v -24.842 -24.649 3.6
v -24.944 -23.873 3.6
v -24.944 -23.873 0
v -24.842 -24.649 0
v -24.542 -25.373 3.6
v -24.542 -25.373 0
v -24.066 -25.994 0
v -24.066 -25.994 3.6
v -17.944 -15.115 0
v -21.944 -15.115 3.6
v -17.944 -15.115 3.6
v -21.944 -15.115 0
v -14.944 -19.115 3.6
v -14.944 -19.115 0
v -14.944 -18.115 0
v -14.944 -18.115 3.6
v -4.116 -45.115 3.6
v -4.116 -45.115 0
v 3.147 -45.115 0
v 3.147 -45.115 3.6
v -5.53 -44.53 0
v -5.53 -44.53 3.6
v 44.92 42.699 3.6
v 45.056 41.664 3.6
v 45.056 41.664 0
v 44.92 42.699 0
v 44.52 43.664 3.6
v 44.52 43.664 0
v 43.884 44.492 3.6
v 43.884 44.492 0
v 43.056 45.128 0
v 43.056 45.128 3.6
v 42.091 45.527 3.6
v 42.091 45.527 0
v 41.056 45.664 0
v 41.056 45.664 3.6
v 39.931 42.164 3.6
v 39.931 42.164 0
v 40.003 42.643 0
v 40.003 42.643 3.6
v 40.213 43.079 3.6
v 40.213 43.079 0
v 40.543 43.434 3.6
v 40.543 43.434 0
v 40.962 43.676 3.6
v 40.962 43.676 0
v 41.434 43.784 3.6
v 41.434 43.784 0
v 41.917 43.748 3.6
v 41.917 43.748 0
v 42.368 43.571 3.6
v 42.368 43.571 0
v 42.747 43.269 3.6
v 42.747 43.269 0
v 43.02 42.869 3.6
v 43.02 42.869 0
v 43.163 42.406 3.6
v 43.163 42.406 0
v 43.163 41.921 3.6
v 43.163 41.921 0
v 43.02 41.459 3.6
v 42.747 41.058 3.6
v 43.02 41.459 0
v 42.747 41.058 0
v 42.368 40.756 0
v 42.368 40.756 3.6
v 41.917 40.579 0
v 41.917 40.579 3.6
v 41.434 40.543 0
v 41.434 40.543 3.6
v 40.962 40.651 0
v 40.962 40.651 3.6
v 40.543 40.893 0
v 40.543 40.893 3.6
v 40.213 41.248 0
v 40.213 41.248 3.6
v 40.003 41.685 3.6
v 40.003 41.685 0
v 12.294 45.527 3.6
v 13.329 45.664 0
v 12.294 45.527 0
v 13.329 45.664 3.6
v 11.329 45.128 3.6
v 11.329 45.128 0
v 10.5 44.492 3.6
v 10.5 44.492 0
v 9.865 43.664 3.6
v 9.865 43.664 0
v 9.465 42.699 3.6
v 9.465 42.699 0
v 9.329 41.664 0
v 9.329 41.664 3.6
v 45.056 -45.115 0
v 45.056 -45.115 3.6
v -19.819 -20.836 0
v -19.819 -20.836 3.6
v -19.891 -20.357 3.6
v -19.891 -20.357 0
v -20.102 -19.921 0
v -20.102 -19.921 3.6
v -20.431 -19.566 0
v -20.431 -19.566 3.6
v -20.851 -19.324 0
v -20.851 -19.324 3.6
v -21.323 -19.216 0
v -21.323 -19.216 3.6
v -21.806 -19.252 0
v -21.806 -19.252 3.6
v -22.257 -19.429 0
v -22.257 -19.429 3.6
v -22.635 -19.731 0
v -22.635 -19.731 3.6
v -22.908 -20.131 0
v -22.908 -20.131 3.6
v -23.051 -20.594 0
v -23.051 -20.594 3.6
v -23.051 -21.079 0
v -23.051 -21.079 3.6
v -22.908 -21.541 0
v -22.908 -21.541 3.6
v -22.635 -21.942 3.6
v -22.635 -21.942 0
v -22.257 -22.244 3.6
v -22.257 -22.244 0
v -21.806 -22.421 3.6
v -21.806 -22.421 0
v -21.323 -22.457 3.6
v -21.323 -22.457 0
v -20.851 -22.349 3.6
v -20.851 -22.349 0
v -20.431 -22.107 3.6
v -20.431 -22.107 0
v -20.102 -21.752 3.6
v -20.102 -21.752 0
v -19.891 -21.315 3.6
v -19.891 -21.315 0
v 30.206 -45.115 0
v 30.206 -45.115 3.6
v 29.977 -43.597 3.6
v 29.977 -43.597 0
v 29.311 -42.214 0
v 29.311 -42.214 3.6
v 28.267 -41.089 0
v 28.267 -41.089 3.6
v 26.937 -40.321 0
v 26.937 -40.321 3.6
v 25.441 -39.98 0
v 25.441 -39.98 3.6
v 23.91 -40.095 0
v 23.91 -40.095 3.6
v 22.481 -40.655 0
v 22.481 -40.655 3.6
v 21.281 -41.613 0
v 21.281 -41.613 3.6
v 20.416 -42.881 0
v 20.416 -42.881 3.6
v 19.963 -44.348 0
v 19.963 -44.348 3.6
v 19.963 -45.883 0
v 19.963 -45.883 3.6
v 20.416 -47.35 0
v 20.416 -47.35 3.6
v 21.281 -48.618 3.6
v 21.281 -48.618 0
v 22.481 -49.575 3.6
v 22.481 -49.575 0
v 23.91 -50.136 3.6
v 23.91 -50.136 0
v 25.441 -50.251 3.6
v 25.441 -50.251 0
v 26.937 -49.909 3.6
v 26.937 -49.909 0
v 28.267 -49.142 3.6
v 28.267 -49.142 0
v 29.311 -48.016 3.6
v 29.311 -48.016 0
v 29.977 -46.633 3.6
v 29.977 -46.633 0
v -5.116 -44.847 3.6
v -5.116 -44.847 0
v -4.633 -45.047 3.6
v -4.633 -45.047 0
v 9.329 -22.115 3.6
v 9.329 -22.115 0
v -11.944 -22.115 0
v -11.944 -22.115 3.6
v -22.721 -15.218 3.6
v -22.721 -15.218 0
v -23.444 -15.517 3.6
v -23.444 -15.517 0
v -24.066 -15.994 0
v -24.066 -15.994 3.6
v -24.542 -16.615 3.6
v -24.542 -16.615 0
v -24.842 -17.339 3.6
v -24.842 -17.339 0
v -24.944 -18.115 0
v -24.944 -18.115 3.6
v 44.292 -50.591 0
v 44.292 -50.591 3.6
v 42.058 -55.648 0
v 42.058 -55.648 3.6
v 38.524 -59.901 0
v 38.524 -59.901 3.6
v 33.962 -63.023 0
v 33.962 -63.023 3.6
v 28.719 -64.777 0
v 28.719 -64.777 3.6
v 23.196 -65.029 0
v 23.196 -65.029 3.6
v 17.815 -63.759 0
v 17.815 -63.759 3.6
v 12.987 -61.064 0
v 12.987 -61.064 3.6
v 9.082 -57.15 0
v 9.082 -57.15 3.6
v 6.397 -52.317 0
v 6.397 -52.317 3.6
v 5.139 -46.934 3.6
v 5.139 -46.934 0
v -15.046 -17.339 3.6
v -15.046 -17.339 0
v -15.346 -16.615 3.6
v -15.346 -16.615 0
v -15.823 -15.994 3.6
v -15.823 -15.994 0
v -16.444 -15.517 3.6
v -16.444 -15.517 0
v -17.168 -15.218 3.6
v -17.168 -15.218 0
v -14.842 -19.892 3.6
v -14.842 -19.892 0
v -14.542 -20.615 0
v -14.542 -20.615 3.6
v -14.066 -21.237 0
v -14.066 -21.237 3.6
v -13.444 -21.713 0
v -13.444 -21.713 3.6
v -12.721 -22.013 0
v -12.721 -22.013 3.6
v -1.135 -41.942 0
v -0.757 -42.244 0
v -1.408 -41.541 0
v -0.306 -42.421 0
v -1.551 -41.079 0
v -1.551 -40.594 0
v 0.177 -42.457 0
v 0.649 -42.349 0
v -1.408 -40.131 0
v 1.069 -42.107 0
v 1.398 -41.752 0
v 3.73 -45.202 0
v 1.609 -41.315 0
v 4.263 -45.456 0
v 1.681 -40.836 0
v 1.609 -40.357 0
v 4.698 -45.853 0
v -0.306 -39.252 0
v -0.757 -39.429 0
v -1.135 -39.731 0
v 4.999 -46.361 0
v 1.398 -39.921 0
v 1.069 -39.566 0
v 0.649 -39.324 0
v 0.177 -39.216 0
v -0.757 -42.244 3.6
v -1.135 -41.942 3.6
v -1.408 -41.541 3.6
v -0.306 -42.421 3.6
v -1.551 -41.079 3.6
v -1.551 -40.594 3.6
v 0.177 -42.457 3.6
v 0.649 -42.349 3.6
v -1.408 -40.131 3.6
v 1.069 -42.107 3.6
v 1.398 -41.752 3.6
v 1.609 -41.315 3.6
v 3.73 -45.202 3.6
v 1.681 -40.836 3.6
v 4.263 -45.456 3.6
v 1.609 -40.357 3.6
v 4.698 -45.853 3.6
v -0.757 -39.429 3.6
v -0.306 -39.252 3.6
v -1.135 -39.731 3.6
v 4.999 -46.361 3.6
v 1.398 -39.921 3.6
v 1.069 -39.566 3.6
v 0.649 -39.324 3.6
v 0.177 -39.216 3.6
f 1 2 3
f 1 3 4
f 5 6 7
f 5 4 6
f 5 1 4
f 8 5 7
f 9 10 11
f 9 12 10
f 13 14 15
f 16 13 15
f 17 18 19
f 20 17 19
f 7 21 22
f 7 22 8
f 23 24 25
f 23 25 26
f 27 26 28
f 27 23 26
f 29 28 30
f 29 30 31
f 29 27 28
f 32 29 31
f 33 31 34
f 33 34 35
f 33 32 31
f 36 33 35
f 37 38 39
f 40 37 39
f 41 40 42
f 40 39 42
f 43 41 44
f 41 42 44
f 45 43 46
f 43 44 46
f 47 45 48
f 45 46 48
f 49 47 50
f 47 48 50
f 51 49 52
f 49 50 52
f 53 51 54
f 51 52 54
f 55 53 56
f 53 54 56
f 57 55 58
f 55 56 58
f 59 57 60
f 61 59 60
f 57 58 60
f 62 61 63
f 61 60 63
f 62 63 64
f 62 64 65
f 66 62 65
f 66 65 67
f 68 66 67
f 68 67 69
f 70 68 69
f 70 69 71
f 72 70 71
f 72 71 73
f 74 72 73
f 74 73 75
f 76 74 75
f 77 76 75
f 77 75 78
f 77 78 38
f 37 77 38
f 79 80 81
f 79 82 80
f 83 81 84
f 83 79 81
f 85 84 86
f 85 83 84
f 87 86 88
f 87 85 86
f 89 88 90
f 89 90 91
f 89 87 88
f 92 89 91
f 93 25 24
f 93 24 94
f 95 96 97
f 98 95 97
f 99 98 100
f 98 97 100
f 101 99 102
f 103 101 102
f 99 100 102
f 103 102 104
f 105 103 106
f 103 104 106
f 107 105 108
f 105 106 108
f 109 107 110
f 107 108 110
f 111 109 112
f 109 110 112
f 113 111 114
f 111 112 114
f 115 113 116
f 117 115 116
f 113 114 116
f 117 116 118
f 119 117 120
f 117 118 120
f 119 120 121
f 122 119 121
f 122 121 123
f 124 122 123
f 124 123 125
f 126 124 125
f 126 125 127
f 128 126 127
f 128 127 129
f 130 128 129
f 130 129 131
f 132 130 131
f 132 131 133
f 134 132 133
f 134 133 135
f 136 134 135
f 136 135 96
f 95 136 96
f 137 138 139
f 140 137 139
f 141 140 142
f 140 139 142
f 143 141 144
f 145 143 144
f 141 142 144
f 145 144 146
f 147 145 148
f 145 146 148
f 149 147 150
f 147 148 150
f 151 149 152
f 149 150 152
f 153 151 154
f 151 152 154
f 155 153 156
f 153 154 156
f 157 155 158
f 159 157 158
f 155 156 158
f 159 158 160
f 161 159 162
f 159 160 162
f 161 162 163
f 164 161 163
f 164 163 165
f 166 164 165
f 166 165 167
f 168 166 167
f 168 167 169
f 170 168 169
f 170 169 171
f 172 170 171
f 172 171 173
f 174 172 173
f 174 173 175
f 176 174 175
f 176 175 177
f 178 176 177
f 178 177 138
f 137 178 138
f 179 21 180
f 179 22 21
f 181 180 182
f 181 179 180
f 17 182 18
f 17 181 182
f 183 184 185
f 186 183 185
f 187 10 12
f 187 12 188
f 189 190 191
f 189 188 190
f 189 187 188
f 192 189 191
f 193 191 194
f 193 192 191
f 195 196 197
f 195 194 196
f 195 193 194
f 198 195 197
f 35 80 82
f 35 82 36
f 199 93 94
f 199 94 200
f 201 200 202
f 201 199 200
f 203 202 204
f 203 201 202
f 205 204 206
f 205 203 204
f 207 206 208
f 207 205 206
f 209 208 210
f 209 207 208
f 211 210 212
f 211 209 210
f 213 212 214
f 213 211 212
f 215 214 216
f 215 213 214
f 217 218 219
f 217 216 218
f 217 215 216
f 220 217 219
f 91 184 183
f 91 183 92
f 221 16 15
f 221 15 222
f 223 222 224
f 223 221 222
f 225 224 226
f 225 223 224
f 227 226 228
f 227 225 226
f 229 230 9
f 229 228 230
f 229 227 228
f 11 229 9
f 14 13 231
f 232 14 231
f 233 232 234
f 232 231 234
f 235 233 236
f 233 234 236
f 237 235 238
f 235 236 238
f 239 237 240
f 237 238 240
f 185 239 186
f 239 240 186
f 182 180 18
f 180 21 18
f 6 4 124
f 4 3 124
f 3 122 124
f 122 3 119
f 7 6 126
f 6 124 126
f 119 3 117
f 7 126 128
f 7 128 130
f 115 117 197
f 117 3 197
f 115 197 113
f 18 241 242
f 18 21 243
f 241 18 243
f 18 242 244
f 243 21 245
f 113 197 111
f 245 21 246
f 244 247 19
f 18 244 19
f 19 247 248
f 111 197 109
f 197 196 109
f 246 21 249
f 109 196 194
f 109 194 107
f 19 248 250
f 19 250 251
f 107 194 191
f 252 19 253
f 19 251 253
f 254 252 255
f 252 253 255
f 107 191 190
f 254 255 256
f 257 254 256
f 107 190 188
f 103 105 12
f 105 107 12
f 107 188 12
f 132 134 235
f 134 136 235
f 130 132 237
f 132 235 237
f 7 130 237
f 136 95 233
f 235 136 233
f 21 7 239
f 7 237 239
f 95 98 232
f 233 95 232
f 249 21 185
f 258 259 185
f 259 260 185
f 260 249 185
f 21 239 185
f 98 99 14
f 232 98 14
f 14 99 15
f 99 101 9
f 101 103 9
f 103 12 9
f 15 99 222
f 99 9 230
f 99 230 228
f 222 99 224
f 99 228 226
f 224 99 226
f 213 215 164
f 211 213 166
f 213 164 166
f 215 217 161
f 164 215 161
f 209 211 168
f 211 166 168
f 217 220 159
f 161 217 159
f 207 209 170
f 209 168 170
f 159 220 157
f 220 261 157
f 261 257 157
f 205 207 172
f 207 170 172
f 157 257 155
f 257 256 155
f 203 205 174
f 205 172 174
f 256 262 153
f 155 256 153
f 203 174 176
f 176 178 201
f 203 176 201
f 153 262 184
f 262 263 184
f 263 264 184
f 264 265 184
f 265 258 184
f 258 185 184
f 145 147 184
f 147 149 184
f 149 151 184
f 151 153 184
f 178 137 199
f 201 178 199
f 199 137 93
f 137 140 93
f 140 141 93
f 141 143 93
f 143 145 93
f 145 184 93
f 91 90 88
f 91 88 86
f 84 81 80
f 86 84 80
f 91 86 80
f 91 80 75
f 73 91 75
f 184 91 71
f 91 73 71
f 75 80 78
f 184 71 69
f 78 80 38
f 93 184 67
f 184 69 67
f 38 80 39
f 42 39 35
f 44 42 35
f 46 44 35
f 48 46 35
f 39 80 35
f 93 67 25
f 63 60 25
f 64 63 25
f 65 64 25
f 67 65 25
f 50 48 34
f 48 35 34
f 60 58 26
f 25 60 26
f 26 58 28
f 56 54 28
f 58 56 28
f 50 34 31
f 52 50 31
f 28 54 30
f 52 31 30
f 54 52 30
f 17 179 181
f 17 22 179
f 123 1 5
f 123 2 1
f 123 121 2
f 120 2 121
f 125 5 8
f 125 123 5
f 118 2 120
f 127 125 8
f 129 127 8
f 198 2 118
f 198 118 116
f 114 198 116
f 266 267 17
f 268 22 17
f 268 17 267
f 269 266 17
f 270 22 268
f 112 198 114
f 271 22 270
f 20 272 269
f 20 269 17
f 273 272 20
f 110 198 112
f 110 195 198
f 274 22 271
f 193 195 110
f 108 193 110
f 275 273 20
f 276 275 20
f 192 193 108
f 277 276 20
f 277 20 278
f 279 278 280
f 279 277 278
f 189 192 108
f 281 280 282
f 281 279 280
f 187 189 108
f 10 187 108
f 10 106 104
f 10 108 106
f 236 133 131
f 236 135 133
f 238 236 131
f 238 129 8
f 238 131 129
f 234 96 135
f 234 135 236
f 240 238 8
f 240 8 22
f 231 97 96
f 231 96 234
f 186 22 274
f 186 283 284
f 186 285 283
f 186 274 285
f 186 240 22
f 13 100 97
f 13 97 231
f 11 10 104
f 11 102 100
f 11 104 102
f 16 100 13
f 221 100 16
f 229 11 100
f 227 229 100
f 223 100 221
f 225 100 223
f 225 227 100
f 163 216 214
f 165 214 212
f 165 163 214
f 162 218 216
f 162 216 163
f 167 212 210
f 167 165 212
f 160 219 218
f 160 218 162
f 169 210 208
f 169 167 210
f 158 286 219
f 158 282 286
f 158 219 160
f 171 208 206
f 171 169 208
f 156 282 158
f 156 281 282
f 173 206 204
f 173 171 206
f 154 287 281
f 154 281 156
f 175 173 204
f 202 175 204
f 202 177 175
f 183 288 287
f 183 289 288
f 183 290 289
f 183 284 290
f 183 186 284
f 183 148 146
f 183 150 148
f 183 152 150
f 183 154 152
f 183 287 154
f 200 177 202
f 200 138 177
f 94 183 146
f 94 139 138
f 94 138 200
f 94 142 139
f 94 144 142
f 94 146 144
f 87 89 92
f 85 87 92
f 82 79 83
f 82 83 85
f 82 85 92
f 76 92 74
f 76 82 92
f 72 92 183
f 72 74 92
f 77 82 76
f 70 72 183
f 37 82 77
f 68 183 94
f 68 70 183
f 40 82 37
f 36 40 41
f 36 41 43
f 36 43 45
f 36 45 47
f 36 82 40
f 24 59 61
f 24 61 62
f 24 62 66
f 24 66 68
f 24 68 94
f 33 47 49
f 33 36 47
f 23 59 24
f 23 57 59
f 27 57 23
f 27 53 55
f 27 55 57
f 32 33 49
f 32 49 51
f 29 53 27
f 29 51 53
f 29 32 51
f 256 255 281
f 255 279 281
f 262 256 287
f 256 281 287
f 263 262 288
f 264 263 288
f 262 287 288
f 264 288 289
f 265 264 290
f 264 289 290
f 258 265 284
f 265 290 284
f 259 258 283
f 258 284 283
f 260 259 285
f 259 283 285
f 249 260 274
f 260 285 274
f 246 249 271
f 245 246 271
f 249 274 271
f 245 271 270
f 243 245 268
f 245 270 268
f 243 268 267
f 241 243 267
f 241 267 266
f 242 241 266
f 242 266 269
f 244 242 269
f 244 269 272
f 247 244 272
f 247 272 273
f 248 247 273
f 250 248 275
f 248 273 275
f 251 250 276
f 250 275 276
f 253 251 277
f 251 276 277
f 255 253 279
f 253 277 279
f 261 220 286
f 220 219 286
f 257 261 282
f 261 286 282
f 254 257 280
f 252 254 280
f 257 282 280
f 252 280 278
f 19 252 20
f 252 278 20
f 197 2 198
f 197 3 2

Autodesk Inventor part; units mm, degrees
ref_plane "YZ Plane" through (0, 0, 0) normal (1, 0, 0) x (0, 1, 0)
ref_plane "XZ Plane" through (0, 0, 0) normal (0, 1, 0) x (-1, 0, 0)
ref_plane "XY Plane" through (0, 0, 0) normal (0, 0, 1) x (1, 0, 0)
sketch "Sketch1" plane through (0, 0, 0) normal (0, 0, 1) x (1, 0, 0)
  circle A0 centre (25.0558, -45.1154) radius 20
  line L0 (45.0558, -45.1154) -> (31.0558, -45.1154)
  line L1 (31.0558, -45.1154) -> (31.0558, -22.1154)
  line L2 (31.0558, -22.1154) -> (45.0558, -22.1154)
  line L3 (45.0558, -22.1154) -> (45.0558, -45.1154)
  line L4 (31.0558, -22.1154) -> (-4.9442, -22.1154)
  line L5 (-4.9442, -22.1154) -> (-4.9442, -45.1154)
  line L6 (-4.9442, -45.1154) -> (31.0558, -45.1154)
  line L7 (31.0558, -45.1154) -> (31.0558, -22.1154)
  line L8 (-4.9442, -45.1154) -> (-24.9442, -25.1154)
  line L9 (-24.9442, -25.1154) -> (-24.9442, -15.1154)
  line L10 (-24.9442, -15.1154) -> (-4.9442, -15.1154)
  line L11 (-4.9442, -15.1154) -> (-4.9442, -22.1154)
  point P0 (0, 0)
  dimension "d0" = 40
  dimension "d1" = 14
  dimension "d2" = 23
  dimension "d20" = 0
  dimension "d21" = 23
  dimension "d22" = 30
  dimension "d23" = 20
  dimension "d24" = 50
  dimension "d45" = 10
extrude "Extrusion1" add sketch "Sketch1" along normal blind 3.6
sketch "Sketch2" plane through (0, 0, 3.6) normal (0, 0, 1) x (1, 0, 0)
  arc A0 (5.0558, -45.1154) -> (45.0558, -45.1154) centre (25.0558, -45.1154) ccw projected
  circle A1 centre (25.0558, -45.1154) radius 5.15
  circle A2 centre (0.0558, -40.8364) radius 1.625
  line L0 (-4.9442, -22.1154) -> (-4.9442, -45.1154) projected
  line L1 (-4.9442, -45.1154) -> (5.0558, -45.1154) projected
  line L2 (45.0558, -45.1154) -> (45.0558, -22.1154) projected
  line L3 (45.0558, -22.1154) -> (-4.9442, -22.1154) projected
  circle A3 centre (-21.4442, -20.8364) radius 1.625
  point P0 (0, 0)
  point P1 (30.9974, -15.1154)
  dimension "d5" = 10.3
  dimension "d6" = 3.25
  dimension "d10" = 4.279
  dimension "d18" = 23
  dimension "d25" = 3.25
  dimension "d26" = 20
  dimension "d27" = 21.5
extrude "Extrusion2" cut sketch "Sketch2" against normal blind 20 contours A1 | A2 | A3
fillet "Fillet1" radius 2 4 edges at (45.0558, -22.1154, 1.8) (-4.9442, -45.1154, 1.8) (-4.9442, -22.1154, 1.8) (5.0558, -45.1154, 1.8)
fillet "Fillet2" radius 3 3 edges at (-24.9442, -25.1154, 1.8) (-24.9442, -15.1154, 1.8) (-4.9442, -15.1154, 1.8)
sketch "Sketch3" plane through (0, 0, 0) normal (0, 0, -1) x (-1, 0, 0)
  line L0 (7.9442, -15.1154) -> (21.9442, -15.1154) projected
  line L1 (14.9442, -15.1154) -> (-0.0558, -15.1154)
  line L2 (-0.0558, -15.1154) -> (-0.0558, -22.1154)
  line L3 (-0.0558, -22.1154) -> (14.9442, -22.1154)
  line L4 (14.9442, -22.1154) -> (14.9442, -15.1154)
  line L5 (4.9442, -19.1154) -> (4.9442, -18.1154) projected
  point P0 (0, 0)
  dimension "d29" = 7
  dimension "d32" = 15
  dimension "d33" = 5
extrude "Extrusion3" cut sketch "Sketch3" against normal blind 10
fillet "Fillet3" radius 3 2 edges at (-14.9442, -15.1154, 1.8) (-14.9442, -22.1154, 1.8)
sketch "Sketch4" plane through (0, 0, 0) normal (0, 0, -1) x (-1, 0, 0)
  line L0 (-45.0558, -45.1154) -> (-45.0558, -24.1154) projected
  line L1 (-45.0558, -28.8196) -> (-9.3289, -28.8196)
  line L2 (-9.3289, -28.8196) -> (-9.3289, 45.6636)
  line L3 (-9.3289, 45.6636) -> (-45.0558, 45.6636)
  line L4 (-45.0558, 45.6636) -> (-45.0558, -28.8196)
  line L5 (-43.0558, -22.1154) -> (11.9442, -22.1154) projected
  circle A0 centre (-0.0558, -40.8364) radius 1.625 projected
  point P0 (0, 0)
  dimension "d36" = 86.5
extrude "Extrusion4" add sketch "Sketch4" against normal blind 3.6 contours L0 L4 L3 L2 L1
fillet "Fillet4" radius 4 2 edges at (9.3289, 45.6636, 1.8) (45.0558, 45.6636, 1.8)
sketch "Sketch5" plane through (0, 0, 0) normal (0, 0, -1) x (-1, 0, 0)
  circle A0 centre (-41.5558, 42.1636) radius 1.625
  line L0 (-13.3289, 45.6636) -> (-41.0558, 45.6636) projected
  line L1 (-45.0558, 41.6636) -> (-45.0558, -45.1154) projected
  point P0 (0, 0)
  point P1 (-41.0558, 41.6636)
  dimension "d40" = 3.25
  dimension "d43" = 3.5
  dimension "d44" = 3.5
extrude "Extrusion5" cut sketch "Sketch5" against normal blind 5
properties part number "p6"
